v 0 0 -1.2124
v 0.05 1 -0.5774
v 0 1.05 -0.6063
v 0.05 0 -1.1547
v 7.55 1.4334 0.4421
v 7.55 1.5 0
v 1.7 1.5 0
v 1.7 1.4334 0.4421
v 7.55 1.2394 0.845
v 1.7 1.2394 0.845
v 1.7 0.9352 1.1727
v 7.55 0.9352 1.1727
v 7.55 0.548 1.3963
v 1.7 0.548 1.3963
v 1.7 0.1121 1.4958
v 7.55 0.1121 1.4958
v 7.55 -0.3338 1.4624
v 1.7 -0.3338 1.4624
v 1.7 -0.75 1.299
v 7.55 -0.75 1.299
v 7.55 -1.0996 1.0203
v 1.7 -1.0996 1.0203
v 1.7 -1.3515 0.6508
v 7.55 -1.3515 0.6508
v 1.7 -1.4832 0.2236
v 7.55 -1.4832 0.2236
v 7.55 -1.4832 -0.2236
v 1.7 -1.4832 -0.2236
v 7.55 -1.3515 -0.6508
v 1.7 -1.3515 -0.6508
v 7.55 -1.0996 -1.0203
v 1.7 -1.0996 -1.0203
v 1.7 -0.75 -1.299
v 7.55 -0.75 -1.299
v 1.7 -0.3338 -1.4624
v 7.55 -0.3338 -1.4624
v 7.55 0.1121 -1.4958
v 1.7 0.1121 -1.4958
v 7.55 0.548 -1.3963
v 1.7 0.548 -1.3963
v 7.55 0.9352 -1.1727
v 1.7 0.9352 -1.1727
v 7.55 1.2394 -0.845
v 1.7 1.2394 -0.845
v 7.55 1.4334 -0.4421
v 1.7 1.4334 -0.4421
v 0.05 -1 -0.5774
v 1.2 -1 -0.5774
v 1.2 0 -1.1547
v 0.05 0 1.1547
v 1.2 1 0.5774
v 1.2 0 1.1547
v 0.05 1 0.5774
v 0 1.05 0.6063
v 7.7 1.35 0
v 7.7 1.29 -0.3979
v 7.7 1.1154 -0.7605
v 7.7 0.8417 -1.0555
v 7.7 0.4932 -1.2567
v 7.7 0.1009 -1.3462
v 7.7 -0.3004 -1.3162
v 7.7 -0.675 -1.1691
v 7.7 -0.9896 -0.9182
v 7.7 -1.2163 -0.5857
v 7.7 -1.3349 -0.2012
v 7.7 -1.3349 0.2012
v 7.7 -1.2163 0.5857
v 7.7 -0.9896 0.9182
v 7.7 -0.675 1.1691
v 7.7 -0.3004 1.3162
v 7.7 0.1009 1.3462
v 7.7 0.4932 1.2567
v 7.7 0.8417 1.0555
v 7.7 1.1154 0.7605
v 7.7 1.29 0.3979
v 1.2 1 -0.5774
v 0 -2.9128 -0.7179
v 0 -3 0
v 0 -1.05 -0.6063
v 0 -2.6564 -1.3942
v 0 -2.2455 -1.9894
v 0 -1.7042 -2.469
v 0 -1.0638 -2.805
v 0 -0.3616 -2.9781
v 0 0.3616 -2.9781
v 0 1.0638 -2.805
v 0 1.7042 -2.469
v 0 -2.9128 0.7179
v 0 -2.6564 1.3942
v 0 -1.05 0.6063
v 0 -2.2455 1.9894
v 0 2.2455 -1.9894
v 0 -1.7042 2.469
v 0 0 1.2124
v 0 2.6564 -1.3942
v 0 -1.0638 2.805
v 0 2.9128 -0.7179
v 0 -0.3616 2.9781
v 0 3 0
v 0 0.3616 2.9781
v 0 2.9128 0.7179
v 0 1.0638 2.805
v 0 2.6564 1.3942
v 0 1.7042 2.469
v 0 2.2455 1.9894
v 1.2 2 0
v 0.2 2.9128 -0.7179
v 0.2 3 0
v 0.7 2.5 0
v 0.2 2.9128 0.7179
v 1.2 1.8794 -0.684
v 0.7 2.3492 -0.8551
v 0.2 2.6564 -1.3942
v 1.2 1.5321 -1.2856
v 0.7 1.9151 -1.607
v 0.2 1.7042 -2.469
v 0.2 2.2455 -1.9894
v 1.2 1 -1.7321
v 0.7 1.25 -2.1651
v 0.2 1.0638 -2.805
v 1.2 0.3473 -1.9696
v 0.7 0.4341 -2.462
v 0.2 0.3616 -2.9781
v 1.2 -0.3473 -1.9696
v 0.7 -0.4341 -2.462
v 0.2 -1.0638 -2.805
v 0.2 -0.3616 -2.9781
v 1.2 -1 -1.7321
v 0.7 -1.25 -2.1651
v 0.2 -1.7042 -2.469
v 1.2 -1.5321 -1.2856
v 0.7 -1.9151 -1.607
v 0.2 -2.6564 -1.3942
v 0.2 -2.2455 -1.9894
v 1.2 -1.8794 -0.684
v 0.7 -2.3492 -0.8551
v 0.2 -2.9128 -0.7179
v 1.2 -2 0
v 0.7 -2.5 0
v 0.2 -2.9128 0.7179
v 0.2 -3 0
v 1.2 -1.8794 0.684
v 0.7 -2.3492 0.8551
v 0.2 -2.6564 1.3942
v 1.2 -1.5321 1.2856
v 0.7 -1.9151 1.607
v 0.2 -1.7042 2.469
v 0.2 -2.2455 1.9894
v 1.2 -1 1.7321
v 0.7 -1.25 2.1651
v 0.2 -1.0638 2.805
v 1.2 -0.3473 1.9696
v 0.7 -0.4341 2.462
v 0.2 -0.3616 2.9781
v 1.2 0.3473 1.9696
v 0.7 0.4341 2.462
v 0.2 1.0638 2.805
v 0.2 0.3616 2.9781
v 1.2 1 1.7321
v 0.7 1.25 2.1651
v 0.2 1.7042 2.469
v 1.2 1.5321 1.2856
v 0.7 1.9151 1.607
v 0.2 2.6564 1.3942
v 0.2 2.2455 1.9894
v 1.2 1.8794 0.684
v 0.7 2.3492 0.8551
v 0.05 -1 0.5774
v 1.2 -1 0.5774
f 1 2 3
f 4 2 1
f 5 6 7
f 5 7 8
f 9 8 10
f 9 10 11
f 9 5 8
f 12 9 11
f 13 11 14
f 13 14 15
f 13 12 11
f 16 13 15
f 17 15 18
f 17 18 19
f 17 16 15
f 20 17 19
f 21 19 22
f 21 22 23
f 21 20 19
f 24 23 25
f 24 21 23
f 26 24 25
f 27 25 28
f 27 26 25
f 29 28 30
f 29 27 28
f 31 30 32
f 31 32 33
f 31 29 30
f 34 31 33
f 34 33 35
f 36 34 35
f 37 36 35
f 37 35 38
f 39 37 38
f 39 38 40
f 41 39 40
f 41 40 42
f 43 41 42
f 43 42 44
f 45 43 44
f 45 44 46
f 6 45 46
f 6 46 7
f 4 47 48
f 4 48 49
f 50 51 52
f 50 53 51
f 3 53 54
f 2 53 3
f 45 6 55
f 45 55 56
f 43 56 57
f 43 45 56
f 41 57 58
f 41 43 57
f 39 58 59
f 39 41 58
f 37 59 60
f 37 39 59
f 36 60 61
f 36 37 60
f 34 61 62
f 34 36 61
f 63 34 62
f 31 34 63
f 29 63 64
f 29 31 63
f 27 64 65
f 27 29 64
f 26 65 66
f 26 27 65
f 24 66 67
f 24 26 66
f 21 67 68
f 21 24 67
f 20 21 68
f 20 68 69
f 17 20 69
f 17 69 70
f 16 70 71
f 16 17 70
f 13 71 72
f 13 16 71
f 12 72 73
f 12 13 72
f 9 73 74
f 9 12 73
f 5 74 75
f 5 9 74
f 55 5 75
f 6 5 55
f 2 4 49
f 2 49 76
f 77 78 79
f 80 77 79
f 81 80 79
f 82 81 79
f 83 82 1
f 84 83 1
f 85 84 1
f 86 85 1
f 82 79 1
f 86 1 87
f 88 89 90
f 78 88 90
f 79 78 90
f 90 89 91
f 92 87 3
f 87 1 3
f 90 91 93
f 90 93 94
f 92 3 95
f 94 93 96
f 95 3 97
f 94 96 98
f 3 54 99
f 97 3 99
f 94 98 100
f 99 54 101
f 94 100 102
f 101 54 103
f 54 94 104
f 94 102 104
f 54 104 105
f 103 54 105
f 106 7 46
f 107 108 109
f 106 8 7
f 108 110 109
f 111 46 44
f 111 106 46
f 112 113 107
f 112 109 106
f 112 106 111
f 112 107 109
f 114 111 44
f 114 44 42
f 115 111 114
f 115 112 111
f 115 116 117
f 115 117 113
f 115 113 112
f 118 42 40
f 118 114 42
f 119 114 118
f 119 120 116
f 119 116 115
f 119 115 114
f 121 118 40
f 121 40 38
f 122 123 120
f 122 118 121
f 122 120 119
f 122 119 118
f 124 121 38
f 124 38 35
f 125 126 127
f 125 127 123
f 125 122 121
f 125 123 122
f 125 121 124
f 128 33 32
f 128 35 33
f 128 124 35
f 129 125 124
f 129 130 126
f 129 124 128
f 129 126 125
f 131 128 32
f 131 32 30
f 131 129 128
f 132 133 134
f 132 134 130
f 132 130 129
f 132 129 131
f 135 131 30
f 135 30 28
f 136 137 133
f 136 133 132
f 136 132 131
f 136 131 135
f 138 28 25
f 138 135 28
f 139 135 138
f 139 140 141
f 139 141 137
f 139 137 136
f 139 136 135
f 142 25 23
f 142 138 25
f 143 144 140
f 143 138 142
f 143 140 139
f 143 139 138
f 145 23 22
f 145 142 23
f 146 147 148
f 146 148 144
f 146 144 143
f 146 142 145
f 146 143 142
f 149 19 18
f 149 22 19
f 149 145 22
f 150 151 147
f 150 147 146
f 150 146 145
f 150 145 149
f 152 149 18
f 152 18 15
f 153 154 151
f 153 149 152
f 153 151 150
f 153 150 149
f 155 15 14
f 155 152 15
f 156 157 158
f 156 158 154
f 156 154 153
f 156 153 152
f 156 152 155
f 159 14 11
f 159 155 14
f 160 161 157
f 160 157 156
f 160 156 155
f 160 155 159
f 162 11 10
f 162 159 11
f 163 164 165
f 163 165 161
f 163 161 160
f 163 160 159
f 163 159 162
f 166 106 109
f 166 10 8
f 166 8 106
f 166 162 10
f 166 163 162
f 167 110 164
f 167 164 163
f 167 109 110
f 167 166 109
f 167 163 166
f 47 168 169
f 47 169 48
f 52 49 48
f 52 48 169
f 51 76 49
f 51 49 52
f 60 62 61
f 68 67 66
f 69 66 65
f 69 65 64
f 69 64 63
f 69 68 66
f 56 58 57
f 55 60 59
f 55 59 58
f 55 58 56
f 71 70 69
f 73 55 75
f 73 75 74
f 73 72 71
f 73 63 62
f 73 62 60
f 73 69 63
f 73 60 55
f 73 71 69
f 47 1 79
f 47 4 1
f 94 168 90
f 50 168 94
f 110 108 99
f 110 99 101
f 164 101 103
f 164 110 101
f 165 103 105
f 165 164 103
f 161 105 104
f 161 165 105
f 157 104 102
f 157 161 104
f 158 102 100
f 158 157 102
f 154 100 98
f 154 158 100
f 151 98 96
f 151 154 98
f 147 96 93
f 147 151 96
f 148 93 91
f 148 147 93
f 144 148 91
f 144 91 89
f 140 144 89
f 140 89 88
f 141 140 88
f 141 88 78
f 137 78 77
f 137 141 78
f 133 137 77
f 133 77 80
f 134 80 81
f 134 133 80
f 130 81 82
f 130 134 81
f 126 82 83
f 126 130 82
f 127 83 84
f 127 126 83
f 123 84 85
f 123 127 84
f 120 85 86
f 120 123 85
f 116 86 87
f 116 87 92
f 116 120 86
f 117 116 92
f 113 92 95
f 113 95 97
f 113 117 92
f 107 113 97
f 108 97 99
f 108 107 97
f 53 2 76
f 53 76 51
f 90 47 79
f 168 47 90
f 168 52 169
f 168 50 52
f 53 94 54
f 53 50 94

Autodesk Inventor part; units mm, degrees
ref_plane "YZ Plane" through (0, 0, 0) normal (1, 0, 0) x (0, 1, 0)
ref_plane "XZ Plane" through (0, 0, 0) normal (0, 1, 0) x (-1, 0, 0)
ref_plane "XY Plane" through (0, 0, 0) normal (0, 0, 1) x (1, 0, 0)
sketch "スケッチ1" plane through (0, 0, 0) normal (0, 0, 1) x (1, 0, 0)
  line L0 (0, 0) -> (0, 3)
  line L1 (0, 3) -> (0.2, 3)
  line L2 (0.2, 3) -> (1.7, 1.5)
  line L3 (1.7, 1.5) -> (7.7, 1.5)
  line L4 (7.7, 1.5) -> (7.7, 0)
  line L5 (0, 0) -> (7.7, 0)
  dimension "d0" = 45
  dimension "d1" = 3
  dimension "d2" = 1.7
  dimension "d3" = 1.5
  dimension "d4" = 6
revolve "回転1" add sketch "スケッチ1" angle 360 about axis through (0, 0, 0) along (1, 0, 0)
thread "ねじ1" size "M3x0.5" class "6g" standard "ANSI Metric M Profile" length 44.8
sketch "スケッチ2" plane through (0, 0, 0) normal (-1, 0, 0) x (0, 0, 1)
  line L0 (0.5774, 1) -> (1.1547, 0)
  line L1 (1.1547, 0) -> (0.5774, -1)
  line L2 (0.5774, -1) -> (-0.5774, -1)
  line L3 (-0.5774, -1) -> (-1.1547, 0)
  line L4 (-1.1547, 0) -> (-0.5774, 1)
  line L5 (-0.5774, 1) -> (0.5774, 1)
  circle A0 centre (0, 0) radius 1.1547
  point P0 (0, 0)
  point P1 (0, 0)
  dimension "d8" = 2
extrude "押し出し1" cut sketch "スケッチ2" against normal blind 1.2 contours L0 L1 L2 L3 L4 L5
chamfer "面取り1" distance 0.05 angle 45 6 edges at (0, -0.5, -0.866) (0, 0.5, -0.866) (0, 1, 0) (0, 0.5, 0.866) (0, -1, 0) (0, -0.5, 0.866)
chamfer "面取り2" distance 0.15 angle 45 1 edges at (7.7, -1.5, 0)
properties part number "ネジ皿M3L6" material "鋼、高強度、低合金"
